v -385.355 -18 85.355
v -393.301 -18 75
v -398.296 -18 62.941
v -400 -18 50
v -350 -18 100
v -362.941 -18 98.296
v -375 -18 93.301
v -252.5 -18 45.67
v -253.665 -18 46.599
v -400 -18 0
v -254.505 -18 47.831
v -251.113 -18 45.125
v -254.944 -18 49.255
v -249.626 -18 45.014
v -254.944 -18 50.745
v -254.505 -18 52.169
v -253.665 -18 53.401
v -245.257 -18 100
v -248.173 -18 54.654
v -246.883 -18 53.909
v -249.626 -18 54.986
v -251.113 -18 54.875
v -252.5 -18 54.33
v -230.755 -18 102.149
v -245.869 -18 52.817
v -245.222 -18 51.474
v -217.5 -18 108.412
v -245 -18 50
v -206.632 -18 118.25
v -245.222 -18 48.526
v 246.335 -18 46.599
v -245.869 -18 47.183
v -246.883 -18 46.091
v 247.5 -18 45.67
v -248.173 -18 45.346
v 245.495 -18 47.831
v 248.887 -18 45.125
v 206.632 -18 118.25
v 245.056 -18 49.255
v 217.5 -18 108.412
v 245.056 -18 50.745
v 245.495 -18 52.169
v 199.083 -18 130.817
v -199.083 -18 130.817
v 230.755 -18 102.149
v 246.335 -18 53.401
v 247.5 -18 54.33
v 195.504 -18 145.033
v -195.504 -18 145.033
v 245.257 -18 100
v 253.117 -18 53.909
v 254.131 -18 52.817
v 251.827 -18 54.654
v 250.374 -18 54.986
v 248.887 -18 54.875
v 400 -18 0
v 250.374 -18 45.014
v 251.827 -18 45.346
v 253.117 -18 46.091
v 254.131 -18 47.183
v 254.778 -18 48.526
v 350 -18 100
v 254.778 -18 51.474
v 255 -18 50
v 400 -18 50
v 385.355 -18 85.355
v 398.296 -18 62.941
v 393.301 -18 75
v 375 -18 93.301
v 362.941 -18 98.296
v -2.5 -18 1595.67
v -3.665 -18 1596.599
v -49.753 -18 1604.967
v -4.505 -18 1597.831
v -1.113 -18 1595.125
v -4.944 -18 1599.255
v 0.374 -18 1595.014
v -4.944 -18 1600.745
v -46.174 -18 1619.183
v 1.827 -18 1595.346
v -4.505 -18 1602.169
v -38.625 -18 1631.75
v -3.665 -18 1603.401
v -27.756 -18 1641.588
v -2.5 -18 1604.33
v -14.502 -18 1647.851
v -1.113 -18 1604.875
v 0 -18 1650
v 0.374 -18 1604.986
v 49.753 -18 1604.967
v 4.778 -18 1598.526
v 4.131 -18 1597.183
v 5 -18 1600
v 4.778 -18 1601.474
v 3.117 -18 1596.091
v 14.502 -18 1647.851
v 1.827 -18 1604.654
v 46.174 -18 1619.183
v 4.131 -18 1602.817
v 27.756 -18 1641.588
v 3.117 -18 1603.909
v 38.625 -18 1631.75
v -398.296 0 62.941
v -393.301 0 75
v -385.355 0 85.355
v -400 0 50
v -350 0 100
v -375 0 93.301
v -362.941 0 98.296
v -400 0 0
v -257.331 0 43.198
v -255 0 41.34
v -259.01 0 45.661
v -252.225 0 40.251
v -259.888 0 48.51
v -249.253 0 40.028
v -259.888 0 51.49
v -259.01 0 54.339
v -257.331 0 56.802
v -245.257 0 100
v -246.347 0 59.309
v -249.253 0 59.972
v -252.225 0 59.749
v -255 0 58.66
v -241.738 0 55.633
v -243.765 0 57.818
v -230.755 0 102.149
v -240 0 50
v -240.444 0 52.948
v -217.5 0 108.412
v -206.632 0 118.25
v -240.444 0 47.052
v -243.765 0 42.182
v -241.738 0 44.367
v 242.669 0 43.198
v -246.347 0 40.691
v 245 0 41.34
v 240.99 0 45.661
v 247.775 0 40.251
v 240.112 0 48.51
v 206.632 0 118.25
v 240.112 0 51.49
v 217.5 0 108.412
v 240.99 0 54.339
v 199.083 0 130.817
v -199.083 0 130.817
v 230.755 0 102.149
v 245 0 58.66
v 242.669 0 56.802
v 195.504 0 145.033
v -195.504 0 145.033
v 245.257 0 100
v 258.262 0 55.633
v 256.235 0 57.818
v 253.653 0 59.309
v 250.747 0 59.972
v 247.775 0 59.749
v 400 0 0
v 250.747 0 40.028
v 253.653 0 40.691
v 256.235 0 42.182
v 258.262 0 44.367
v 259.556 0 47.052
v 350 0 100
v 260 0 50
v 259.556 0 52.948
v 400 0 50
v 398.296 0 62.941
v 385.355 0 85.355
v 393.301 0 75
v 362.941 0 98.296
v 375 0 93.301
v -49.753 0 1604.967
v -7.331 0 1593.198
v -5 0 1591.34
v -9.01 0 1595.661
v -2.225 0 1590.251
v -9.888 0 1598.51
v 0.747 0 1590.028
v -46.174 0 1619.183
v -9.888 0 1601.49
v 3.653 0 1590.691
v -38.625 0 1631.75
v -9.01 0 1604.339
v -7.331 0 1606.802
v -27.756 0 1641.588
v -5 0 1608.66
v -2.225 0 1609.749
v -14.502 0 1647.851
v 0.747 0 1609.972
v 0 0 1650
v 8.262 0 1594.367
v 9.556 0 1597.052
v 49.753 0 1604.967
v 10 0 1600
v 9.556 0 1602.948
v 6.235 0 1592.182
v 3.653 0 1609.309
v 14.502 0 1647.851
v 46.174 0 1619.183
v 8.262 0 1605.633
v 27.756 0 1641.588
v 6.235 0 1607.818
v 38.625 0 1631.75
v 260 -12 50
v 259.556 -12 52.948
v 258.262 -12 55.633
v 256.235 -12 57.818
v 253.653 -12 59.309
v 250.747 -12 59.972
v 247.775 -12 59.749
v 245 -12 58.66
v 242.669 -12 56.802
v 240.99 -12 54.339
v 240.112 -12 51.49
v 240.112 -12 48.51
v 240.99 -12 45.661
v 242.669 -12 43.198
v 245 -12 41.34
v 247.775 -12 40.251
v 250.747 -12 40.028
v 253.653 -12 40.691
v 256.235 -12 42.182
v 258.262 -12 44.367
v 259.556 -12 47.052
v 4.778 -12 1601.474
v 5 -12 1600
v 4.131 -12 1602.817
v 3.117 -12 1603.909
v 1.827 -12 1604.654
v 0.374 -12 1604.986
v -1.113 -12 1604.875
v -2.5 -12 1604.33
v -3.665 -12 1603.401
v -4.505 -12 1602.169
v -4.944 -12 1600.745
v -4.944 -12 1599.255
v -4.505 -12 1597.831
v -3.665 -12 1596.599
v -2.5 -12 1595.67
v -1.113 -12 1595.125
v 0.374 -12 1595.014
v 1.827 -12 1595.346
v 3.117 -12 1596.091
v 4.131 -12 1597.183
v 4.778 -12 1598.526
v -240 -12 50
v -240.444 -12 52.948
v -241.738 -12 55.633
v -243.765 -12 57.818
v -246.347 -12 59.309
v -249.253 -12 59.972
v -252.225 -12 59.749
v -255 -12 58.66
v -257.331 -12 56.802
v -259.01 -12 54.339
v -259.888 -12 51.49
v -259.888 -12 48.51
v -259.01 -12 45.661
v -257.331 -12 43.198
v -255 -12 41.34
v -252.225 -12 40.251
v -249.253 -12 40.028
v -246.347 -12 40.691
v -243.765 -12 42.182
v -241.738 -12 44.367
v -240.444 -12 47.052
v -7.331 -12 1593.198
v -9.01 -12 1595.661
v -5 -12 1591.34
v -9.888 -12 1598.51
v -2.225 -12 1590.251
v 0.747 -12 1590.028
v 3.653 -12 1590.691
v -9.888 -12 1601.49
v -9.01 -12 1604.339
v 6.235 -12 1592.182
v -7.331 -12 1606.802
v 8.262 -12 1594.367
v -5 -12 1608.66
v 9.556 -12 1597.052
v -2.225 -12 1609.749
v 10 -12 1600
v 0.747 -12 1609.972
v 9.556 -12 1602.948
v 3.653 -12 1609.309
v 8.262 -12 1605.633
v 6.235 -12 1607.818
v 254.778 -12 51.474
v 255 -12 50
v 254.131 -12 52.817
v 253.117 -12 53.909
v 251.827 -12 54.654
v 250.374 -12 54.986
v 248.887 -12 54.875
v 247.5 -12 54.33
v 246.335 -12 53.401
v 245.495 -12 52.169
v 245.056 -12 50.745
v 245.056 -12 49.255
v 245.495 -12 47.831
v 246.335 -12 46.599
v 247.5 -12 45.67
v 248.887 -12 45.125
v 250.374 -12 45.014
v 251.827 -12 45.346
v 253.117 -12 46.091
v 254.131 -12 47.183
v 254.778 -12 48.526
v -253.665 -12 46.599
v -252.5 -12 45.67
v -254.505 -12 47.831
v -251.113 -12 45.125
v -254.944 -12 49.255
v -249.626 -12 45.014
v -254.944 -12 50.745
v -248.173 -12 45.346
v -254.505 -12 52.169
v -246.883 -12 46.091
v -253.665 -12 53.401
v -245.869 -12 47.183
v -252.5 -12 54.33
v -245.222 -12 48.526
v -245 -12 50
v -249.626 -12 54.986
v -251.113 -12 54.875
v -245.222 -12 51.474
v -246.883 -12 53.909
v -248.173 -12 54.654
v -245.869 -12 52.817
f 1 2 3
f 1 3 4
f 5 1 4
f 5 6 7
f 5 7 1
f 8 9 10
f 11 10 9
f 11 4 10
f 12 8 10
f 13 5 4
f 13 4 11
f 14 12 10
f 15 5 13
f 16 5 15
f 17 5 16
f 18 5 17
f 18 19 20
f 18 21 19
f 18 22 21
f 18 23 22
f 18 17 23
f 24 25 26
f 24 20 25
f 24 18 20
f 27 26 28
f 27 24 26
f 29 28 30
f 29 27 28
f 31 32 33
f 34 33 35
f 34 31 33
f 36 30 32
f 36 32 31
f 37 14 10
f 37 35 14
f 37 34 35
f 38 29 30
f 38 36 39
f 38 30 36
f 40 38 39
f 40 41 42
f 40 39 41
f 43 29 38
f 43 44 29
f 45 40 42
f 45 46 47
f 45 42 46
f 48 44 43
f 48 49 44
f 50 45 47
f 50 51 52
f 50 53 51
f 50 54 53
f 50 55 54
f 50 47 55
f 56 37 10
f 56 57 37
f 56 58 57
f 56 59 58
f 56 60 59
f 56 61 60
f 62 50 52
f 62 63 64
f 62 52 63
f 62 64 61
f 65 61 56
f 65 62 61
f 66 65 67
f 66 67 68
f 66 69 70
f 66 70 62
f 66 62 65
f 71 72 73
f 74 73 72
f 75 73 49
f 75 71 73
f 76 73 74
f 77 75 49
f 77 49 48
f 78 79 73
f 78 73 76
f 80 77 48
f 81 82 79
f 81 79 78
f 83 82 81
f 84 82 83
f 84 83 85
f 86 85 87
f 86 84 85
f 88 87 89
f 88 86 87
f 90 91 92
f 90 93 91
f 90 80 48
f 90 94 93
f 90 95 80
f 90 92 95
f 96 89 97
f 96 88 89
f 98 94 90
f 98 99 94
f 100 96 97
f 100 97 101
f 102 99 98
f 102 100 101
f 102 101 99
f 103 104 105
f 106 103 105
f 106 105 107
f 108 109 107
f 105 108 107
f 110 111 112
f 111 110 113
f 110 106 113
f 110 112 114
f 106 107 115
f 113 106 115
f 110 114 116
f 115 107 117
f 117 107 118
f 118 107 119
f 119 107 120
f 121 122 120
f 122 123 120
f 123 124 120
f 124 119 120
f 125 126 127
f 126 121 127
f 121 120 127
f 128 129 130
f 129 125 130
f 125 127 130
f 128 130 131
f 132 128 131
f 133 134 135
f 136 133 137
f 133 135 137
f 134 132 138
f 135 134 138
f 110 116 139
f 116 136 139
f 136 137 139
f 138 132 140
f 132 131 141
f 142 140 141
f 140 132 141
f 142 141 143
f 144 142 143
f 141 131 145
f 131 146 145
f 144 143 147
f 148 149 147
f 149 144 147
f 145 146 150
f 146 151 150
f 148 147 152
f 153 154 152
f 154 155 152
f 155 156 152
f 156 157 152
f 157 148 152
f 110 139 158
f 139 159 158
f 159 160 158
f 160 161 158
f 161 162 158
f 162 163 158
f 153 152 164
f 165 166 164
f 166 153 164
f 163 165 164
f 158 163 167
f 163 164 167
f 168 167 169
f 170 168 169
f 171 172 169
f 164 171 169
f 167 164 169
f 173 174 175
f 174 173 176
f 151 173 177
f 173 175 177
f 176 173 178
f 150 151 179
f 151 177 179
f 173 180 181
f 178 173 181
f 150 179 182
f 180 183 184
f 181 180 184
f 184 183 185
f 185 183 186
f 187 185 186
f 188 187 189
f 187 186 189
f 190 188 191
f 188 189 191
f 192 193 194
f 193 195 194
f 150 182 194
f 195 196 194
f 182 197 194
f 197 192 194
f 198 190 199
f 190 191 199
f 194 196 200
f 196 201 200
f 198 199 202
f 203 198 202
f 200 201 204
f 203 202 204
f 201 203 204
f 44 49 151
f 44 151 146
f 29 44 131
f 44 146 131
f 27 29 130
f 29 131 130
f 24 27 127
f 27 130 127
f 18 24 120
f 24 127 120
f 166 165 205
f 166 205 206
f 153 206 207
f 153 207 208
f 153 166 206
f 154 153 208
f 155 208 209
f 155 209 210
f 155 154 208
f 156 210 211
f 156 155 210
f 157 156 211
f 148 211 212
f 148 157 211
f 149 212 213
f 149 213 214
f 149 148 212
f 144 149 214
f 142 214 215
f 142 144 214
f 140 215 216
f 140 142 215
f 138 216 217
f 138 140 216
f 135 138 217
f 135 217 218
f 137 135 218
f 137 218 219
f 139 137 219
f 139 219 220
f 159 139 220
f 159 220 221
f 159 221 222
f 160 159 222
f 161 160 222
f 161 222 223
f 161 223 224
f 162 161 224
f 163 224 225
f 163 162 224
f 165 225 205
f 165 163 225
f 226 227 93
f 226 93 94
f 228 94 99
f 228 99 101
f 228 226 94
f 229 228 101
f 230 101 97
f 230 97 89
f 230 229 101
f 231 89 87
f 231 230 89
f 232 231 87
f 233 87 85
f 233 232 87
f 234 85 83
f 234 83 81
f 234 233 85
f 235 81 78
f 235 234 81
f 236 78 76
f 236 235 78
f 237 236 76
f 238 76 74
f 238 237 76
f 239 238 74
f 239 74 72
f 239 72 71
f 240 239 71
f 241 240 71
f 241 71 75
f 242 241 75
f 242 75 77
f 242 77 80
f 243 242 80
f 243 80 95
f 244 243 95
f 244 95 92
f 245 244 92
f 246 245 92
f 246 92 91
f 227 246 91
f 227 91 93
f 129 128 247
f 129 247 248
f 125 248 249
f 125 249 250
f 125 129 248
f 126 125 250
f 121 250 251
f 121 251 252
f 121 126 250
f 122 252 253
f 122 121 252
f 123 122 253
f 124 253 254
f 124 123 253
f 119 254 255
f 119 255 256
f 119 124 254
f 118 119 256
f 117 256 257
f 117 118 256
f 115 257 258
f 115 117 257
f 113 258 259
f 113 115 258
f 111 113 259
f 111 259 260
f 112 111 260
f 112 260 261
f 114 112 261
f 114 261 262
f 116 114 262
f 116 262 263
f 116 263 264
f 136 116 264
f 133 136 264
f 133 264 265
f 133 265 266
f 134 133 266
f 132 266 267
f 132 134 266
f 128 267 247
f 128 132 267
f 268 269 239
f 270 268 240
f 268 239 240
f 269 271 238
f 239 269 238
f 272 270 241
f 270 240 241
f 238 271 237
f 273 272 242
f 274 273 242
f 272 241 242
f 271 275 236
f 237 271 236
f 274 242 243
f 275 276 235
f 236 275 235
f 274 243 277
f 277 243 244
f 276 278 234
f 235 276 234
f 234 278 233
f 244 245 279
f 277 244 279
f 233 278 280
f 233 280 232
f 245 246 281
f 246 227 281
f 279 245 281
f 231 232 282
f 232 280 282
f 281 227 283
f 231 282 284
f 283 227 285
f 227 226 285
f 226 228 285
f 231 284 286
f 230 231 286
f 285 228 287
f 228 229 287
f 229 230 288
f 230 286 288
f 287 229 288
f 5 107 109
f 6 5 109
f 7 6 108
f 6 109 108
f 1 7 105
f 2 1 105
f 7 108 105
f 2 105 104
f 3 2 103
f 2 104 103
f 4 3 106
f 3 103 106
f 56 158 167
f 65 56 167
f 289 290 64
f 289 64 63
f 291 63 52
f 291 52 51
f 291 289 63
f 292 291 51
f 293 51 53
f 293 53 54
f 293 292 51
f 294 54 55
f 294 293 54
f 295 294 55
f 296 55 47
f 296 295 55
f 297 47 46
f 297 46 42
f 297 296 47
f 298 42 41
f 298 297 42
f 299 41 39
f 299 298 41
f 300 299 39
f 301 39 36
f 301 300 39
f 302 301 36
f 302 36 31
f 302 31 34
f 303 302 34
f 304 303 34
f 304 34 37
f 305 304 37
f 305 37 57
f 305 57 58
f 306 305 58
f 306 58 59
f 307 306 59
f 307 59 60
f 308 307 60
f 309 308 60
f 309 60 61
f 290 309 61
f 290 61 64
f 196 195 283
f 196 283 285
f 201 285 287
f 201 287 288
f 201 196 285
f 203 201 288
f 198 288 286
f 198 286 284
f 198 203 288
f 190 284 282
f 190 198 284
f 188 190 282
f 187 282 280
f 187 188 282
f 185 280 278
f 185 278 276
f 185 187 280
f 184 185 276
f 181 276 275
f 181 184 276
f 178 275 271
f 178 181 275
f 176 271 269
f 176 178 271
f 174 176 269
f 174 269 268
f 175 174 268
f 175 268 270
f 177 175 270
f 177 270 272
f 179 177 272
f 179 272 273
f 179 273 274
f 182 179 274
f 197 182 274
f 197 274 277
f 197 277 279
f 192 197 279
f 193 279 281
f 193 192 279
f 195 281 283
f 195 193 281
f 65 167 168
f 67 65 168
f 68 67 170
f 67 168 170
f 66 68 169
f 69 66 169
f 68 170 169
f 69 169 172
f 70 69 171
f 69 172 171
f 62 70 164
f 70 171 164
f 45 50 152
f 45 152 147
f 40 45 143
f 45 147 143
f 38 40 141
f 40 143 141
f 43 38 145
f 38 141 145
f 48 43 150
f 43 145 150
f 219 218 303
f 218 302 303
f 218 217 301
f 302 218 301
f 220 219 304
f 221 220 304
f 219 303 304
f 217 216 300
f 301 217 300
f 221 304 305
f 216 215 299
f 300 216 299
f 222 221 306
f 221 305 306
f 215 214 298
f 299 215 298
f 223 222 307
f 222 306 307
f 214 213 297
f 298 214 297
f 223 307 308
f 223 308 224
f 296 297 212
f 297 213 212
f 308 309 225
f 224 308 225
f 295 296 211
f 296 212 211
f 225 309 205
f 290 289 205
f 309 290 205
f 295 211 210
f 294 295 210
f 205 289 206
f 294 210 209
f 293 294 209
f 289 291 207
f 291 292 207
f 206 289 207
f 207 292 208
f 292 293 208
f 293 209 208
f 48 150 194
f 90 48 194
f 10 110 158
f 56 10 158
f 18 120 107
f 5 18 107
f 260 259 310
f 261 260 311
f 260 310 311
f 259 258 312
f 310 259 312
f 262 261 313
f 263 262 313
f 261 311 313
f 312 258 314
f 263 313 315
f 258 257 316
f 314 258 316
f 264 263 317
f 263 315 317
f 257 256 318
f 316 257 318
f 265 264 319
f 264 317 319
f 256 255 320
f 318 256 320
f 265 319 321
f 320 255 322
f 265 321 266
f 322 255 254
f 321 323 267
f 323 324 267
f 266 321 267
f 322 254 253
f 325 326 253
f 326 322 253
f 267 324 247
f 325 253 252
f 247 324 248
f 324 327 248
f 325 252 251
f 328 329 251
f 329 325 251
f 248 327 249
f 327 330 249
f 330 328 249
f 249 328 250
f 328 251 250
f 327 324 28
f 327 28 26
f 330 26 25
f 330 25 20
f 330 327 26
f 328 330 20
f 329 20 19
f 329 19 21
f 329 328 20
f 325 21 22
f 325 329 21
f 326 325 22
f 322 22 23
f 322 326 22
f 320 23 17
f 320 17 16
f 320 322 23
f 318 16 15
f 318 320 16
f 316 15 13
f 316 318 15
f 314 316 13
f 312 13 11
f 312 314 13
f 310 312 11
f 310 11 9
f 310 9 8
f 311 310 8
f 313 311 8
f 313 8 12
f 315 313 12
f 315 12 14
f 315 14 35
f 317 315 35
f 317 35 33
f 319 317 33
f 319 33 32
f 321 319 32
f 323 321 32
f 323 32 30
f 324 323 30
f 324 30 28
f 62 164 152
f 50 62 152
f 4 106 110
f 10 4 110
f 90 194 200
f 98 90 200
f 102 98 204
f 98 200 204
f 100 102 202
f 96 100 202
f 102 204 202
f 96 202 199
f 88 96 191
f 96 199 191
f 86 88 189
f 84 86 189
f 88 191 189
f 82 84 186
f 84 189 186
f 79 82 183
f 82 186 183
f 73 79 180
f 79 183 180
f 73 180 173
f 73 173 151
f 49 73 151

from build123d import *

# Parameters (mm, degrees)
F1_R     = 10
F1_R_2   = 5
F2_DEPTH = 18
F3_DEPTH = 12


with BuildPart() as f2:
    # F1 (on Front) → F2 (new body)
    with BuildSketch(Plane.XZ):
        with BuildLine():
            Line((-400, 0), (0, 0))
            Line((0, 0), (400, 0))
            Line((400, 0), (400, 50))
            ThreePointArc((400, 50), (385.3553390593, 85.3553390593), (350, 100))
            Line((350, 100), (245.256839525, 100))
            ThreePointArc((245.256839525, 100), (211.7035324399, 112.9301256591), (195.5041644303, 145.032976654))
            Line((195.5041644303, 145.032976654), (49.7526750947, 1604.967023346))
            ThreePointArc((49.7526750947, 1604.967023346), (0, 1650), (-49.7526750947, 1604.967023346))
            Line((-49.7526750947, 1604.967023346), (-195.5041644303, 145.032976654))
            ThreePointArc((-195.5041644303, 145.032976654), (-211.7035324399, 112.9301256591), (-245.256839525, 100))
            Line((-245.256839525, 100), (-350, 100))
            ThreePointArc((-350, 100), (-385.3553390593, 85.3553390593), (-400, 50))
            Line((-400, 50), (-400, 0))
        make_face()
        with Locations((-250, 50)):
            Circle(F1_R, mode=Mode.SUBTRACT)
        with Locations((250, 50)):
            Circle(F1_R, mode=Mode.SUBTRACT)
        with Locations((0, 1600)):
            Circle(F1_R, mode=Mode.SUBTRACT)
        with Locations((0, 1600)):
            Circle(F1_R)
        with Locations((0, 1600)):
            Circle(F1_R_2, mode=Mode.SUBTRACT)
        with Locations((-250, 50)):
            Circle(F1_R)
        with Locations((-250, 50)):
            Circle(F1_R_2, mode=Mode.SUBTRACT)
        with Locations((250, 50)):
            Circle(F1_R)
        with Locations((250, 50)):
            Circle(F1_R_2, mode=Mode.SUBTRACT)
    extrude(amount=F2_DEPTH)

    # F1 (on Front) → F3 (cut)
    with BuildSketch(Plane.XZ):
        with Locations((0, 1600)):
            Circle(F1_R)
        with Locations((0, 1600)):
            Circle(F1_R_2, mode=Mode.SUBTRACT)
        with Locations((250, 50)):
            Circle(F1_R)
        with Locations((250, 50)):
            Circle(F1_R_2, mode=Mode.SUBTRACT)
        with Locations((-250, 50)):
            Circle(F1_R)
        with Locations((-250, 50)):
            Circle(F1_R_2, mode=Mode.SUBTRACT)
    extrude(amount=F3_DEPTH, mode=Mode.SUBTRACT)


solid = f2.part
